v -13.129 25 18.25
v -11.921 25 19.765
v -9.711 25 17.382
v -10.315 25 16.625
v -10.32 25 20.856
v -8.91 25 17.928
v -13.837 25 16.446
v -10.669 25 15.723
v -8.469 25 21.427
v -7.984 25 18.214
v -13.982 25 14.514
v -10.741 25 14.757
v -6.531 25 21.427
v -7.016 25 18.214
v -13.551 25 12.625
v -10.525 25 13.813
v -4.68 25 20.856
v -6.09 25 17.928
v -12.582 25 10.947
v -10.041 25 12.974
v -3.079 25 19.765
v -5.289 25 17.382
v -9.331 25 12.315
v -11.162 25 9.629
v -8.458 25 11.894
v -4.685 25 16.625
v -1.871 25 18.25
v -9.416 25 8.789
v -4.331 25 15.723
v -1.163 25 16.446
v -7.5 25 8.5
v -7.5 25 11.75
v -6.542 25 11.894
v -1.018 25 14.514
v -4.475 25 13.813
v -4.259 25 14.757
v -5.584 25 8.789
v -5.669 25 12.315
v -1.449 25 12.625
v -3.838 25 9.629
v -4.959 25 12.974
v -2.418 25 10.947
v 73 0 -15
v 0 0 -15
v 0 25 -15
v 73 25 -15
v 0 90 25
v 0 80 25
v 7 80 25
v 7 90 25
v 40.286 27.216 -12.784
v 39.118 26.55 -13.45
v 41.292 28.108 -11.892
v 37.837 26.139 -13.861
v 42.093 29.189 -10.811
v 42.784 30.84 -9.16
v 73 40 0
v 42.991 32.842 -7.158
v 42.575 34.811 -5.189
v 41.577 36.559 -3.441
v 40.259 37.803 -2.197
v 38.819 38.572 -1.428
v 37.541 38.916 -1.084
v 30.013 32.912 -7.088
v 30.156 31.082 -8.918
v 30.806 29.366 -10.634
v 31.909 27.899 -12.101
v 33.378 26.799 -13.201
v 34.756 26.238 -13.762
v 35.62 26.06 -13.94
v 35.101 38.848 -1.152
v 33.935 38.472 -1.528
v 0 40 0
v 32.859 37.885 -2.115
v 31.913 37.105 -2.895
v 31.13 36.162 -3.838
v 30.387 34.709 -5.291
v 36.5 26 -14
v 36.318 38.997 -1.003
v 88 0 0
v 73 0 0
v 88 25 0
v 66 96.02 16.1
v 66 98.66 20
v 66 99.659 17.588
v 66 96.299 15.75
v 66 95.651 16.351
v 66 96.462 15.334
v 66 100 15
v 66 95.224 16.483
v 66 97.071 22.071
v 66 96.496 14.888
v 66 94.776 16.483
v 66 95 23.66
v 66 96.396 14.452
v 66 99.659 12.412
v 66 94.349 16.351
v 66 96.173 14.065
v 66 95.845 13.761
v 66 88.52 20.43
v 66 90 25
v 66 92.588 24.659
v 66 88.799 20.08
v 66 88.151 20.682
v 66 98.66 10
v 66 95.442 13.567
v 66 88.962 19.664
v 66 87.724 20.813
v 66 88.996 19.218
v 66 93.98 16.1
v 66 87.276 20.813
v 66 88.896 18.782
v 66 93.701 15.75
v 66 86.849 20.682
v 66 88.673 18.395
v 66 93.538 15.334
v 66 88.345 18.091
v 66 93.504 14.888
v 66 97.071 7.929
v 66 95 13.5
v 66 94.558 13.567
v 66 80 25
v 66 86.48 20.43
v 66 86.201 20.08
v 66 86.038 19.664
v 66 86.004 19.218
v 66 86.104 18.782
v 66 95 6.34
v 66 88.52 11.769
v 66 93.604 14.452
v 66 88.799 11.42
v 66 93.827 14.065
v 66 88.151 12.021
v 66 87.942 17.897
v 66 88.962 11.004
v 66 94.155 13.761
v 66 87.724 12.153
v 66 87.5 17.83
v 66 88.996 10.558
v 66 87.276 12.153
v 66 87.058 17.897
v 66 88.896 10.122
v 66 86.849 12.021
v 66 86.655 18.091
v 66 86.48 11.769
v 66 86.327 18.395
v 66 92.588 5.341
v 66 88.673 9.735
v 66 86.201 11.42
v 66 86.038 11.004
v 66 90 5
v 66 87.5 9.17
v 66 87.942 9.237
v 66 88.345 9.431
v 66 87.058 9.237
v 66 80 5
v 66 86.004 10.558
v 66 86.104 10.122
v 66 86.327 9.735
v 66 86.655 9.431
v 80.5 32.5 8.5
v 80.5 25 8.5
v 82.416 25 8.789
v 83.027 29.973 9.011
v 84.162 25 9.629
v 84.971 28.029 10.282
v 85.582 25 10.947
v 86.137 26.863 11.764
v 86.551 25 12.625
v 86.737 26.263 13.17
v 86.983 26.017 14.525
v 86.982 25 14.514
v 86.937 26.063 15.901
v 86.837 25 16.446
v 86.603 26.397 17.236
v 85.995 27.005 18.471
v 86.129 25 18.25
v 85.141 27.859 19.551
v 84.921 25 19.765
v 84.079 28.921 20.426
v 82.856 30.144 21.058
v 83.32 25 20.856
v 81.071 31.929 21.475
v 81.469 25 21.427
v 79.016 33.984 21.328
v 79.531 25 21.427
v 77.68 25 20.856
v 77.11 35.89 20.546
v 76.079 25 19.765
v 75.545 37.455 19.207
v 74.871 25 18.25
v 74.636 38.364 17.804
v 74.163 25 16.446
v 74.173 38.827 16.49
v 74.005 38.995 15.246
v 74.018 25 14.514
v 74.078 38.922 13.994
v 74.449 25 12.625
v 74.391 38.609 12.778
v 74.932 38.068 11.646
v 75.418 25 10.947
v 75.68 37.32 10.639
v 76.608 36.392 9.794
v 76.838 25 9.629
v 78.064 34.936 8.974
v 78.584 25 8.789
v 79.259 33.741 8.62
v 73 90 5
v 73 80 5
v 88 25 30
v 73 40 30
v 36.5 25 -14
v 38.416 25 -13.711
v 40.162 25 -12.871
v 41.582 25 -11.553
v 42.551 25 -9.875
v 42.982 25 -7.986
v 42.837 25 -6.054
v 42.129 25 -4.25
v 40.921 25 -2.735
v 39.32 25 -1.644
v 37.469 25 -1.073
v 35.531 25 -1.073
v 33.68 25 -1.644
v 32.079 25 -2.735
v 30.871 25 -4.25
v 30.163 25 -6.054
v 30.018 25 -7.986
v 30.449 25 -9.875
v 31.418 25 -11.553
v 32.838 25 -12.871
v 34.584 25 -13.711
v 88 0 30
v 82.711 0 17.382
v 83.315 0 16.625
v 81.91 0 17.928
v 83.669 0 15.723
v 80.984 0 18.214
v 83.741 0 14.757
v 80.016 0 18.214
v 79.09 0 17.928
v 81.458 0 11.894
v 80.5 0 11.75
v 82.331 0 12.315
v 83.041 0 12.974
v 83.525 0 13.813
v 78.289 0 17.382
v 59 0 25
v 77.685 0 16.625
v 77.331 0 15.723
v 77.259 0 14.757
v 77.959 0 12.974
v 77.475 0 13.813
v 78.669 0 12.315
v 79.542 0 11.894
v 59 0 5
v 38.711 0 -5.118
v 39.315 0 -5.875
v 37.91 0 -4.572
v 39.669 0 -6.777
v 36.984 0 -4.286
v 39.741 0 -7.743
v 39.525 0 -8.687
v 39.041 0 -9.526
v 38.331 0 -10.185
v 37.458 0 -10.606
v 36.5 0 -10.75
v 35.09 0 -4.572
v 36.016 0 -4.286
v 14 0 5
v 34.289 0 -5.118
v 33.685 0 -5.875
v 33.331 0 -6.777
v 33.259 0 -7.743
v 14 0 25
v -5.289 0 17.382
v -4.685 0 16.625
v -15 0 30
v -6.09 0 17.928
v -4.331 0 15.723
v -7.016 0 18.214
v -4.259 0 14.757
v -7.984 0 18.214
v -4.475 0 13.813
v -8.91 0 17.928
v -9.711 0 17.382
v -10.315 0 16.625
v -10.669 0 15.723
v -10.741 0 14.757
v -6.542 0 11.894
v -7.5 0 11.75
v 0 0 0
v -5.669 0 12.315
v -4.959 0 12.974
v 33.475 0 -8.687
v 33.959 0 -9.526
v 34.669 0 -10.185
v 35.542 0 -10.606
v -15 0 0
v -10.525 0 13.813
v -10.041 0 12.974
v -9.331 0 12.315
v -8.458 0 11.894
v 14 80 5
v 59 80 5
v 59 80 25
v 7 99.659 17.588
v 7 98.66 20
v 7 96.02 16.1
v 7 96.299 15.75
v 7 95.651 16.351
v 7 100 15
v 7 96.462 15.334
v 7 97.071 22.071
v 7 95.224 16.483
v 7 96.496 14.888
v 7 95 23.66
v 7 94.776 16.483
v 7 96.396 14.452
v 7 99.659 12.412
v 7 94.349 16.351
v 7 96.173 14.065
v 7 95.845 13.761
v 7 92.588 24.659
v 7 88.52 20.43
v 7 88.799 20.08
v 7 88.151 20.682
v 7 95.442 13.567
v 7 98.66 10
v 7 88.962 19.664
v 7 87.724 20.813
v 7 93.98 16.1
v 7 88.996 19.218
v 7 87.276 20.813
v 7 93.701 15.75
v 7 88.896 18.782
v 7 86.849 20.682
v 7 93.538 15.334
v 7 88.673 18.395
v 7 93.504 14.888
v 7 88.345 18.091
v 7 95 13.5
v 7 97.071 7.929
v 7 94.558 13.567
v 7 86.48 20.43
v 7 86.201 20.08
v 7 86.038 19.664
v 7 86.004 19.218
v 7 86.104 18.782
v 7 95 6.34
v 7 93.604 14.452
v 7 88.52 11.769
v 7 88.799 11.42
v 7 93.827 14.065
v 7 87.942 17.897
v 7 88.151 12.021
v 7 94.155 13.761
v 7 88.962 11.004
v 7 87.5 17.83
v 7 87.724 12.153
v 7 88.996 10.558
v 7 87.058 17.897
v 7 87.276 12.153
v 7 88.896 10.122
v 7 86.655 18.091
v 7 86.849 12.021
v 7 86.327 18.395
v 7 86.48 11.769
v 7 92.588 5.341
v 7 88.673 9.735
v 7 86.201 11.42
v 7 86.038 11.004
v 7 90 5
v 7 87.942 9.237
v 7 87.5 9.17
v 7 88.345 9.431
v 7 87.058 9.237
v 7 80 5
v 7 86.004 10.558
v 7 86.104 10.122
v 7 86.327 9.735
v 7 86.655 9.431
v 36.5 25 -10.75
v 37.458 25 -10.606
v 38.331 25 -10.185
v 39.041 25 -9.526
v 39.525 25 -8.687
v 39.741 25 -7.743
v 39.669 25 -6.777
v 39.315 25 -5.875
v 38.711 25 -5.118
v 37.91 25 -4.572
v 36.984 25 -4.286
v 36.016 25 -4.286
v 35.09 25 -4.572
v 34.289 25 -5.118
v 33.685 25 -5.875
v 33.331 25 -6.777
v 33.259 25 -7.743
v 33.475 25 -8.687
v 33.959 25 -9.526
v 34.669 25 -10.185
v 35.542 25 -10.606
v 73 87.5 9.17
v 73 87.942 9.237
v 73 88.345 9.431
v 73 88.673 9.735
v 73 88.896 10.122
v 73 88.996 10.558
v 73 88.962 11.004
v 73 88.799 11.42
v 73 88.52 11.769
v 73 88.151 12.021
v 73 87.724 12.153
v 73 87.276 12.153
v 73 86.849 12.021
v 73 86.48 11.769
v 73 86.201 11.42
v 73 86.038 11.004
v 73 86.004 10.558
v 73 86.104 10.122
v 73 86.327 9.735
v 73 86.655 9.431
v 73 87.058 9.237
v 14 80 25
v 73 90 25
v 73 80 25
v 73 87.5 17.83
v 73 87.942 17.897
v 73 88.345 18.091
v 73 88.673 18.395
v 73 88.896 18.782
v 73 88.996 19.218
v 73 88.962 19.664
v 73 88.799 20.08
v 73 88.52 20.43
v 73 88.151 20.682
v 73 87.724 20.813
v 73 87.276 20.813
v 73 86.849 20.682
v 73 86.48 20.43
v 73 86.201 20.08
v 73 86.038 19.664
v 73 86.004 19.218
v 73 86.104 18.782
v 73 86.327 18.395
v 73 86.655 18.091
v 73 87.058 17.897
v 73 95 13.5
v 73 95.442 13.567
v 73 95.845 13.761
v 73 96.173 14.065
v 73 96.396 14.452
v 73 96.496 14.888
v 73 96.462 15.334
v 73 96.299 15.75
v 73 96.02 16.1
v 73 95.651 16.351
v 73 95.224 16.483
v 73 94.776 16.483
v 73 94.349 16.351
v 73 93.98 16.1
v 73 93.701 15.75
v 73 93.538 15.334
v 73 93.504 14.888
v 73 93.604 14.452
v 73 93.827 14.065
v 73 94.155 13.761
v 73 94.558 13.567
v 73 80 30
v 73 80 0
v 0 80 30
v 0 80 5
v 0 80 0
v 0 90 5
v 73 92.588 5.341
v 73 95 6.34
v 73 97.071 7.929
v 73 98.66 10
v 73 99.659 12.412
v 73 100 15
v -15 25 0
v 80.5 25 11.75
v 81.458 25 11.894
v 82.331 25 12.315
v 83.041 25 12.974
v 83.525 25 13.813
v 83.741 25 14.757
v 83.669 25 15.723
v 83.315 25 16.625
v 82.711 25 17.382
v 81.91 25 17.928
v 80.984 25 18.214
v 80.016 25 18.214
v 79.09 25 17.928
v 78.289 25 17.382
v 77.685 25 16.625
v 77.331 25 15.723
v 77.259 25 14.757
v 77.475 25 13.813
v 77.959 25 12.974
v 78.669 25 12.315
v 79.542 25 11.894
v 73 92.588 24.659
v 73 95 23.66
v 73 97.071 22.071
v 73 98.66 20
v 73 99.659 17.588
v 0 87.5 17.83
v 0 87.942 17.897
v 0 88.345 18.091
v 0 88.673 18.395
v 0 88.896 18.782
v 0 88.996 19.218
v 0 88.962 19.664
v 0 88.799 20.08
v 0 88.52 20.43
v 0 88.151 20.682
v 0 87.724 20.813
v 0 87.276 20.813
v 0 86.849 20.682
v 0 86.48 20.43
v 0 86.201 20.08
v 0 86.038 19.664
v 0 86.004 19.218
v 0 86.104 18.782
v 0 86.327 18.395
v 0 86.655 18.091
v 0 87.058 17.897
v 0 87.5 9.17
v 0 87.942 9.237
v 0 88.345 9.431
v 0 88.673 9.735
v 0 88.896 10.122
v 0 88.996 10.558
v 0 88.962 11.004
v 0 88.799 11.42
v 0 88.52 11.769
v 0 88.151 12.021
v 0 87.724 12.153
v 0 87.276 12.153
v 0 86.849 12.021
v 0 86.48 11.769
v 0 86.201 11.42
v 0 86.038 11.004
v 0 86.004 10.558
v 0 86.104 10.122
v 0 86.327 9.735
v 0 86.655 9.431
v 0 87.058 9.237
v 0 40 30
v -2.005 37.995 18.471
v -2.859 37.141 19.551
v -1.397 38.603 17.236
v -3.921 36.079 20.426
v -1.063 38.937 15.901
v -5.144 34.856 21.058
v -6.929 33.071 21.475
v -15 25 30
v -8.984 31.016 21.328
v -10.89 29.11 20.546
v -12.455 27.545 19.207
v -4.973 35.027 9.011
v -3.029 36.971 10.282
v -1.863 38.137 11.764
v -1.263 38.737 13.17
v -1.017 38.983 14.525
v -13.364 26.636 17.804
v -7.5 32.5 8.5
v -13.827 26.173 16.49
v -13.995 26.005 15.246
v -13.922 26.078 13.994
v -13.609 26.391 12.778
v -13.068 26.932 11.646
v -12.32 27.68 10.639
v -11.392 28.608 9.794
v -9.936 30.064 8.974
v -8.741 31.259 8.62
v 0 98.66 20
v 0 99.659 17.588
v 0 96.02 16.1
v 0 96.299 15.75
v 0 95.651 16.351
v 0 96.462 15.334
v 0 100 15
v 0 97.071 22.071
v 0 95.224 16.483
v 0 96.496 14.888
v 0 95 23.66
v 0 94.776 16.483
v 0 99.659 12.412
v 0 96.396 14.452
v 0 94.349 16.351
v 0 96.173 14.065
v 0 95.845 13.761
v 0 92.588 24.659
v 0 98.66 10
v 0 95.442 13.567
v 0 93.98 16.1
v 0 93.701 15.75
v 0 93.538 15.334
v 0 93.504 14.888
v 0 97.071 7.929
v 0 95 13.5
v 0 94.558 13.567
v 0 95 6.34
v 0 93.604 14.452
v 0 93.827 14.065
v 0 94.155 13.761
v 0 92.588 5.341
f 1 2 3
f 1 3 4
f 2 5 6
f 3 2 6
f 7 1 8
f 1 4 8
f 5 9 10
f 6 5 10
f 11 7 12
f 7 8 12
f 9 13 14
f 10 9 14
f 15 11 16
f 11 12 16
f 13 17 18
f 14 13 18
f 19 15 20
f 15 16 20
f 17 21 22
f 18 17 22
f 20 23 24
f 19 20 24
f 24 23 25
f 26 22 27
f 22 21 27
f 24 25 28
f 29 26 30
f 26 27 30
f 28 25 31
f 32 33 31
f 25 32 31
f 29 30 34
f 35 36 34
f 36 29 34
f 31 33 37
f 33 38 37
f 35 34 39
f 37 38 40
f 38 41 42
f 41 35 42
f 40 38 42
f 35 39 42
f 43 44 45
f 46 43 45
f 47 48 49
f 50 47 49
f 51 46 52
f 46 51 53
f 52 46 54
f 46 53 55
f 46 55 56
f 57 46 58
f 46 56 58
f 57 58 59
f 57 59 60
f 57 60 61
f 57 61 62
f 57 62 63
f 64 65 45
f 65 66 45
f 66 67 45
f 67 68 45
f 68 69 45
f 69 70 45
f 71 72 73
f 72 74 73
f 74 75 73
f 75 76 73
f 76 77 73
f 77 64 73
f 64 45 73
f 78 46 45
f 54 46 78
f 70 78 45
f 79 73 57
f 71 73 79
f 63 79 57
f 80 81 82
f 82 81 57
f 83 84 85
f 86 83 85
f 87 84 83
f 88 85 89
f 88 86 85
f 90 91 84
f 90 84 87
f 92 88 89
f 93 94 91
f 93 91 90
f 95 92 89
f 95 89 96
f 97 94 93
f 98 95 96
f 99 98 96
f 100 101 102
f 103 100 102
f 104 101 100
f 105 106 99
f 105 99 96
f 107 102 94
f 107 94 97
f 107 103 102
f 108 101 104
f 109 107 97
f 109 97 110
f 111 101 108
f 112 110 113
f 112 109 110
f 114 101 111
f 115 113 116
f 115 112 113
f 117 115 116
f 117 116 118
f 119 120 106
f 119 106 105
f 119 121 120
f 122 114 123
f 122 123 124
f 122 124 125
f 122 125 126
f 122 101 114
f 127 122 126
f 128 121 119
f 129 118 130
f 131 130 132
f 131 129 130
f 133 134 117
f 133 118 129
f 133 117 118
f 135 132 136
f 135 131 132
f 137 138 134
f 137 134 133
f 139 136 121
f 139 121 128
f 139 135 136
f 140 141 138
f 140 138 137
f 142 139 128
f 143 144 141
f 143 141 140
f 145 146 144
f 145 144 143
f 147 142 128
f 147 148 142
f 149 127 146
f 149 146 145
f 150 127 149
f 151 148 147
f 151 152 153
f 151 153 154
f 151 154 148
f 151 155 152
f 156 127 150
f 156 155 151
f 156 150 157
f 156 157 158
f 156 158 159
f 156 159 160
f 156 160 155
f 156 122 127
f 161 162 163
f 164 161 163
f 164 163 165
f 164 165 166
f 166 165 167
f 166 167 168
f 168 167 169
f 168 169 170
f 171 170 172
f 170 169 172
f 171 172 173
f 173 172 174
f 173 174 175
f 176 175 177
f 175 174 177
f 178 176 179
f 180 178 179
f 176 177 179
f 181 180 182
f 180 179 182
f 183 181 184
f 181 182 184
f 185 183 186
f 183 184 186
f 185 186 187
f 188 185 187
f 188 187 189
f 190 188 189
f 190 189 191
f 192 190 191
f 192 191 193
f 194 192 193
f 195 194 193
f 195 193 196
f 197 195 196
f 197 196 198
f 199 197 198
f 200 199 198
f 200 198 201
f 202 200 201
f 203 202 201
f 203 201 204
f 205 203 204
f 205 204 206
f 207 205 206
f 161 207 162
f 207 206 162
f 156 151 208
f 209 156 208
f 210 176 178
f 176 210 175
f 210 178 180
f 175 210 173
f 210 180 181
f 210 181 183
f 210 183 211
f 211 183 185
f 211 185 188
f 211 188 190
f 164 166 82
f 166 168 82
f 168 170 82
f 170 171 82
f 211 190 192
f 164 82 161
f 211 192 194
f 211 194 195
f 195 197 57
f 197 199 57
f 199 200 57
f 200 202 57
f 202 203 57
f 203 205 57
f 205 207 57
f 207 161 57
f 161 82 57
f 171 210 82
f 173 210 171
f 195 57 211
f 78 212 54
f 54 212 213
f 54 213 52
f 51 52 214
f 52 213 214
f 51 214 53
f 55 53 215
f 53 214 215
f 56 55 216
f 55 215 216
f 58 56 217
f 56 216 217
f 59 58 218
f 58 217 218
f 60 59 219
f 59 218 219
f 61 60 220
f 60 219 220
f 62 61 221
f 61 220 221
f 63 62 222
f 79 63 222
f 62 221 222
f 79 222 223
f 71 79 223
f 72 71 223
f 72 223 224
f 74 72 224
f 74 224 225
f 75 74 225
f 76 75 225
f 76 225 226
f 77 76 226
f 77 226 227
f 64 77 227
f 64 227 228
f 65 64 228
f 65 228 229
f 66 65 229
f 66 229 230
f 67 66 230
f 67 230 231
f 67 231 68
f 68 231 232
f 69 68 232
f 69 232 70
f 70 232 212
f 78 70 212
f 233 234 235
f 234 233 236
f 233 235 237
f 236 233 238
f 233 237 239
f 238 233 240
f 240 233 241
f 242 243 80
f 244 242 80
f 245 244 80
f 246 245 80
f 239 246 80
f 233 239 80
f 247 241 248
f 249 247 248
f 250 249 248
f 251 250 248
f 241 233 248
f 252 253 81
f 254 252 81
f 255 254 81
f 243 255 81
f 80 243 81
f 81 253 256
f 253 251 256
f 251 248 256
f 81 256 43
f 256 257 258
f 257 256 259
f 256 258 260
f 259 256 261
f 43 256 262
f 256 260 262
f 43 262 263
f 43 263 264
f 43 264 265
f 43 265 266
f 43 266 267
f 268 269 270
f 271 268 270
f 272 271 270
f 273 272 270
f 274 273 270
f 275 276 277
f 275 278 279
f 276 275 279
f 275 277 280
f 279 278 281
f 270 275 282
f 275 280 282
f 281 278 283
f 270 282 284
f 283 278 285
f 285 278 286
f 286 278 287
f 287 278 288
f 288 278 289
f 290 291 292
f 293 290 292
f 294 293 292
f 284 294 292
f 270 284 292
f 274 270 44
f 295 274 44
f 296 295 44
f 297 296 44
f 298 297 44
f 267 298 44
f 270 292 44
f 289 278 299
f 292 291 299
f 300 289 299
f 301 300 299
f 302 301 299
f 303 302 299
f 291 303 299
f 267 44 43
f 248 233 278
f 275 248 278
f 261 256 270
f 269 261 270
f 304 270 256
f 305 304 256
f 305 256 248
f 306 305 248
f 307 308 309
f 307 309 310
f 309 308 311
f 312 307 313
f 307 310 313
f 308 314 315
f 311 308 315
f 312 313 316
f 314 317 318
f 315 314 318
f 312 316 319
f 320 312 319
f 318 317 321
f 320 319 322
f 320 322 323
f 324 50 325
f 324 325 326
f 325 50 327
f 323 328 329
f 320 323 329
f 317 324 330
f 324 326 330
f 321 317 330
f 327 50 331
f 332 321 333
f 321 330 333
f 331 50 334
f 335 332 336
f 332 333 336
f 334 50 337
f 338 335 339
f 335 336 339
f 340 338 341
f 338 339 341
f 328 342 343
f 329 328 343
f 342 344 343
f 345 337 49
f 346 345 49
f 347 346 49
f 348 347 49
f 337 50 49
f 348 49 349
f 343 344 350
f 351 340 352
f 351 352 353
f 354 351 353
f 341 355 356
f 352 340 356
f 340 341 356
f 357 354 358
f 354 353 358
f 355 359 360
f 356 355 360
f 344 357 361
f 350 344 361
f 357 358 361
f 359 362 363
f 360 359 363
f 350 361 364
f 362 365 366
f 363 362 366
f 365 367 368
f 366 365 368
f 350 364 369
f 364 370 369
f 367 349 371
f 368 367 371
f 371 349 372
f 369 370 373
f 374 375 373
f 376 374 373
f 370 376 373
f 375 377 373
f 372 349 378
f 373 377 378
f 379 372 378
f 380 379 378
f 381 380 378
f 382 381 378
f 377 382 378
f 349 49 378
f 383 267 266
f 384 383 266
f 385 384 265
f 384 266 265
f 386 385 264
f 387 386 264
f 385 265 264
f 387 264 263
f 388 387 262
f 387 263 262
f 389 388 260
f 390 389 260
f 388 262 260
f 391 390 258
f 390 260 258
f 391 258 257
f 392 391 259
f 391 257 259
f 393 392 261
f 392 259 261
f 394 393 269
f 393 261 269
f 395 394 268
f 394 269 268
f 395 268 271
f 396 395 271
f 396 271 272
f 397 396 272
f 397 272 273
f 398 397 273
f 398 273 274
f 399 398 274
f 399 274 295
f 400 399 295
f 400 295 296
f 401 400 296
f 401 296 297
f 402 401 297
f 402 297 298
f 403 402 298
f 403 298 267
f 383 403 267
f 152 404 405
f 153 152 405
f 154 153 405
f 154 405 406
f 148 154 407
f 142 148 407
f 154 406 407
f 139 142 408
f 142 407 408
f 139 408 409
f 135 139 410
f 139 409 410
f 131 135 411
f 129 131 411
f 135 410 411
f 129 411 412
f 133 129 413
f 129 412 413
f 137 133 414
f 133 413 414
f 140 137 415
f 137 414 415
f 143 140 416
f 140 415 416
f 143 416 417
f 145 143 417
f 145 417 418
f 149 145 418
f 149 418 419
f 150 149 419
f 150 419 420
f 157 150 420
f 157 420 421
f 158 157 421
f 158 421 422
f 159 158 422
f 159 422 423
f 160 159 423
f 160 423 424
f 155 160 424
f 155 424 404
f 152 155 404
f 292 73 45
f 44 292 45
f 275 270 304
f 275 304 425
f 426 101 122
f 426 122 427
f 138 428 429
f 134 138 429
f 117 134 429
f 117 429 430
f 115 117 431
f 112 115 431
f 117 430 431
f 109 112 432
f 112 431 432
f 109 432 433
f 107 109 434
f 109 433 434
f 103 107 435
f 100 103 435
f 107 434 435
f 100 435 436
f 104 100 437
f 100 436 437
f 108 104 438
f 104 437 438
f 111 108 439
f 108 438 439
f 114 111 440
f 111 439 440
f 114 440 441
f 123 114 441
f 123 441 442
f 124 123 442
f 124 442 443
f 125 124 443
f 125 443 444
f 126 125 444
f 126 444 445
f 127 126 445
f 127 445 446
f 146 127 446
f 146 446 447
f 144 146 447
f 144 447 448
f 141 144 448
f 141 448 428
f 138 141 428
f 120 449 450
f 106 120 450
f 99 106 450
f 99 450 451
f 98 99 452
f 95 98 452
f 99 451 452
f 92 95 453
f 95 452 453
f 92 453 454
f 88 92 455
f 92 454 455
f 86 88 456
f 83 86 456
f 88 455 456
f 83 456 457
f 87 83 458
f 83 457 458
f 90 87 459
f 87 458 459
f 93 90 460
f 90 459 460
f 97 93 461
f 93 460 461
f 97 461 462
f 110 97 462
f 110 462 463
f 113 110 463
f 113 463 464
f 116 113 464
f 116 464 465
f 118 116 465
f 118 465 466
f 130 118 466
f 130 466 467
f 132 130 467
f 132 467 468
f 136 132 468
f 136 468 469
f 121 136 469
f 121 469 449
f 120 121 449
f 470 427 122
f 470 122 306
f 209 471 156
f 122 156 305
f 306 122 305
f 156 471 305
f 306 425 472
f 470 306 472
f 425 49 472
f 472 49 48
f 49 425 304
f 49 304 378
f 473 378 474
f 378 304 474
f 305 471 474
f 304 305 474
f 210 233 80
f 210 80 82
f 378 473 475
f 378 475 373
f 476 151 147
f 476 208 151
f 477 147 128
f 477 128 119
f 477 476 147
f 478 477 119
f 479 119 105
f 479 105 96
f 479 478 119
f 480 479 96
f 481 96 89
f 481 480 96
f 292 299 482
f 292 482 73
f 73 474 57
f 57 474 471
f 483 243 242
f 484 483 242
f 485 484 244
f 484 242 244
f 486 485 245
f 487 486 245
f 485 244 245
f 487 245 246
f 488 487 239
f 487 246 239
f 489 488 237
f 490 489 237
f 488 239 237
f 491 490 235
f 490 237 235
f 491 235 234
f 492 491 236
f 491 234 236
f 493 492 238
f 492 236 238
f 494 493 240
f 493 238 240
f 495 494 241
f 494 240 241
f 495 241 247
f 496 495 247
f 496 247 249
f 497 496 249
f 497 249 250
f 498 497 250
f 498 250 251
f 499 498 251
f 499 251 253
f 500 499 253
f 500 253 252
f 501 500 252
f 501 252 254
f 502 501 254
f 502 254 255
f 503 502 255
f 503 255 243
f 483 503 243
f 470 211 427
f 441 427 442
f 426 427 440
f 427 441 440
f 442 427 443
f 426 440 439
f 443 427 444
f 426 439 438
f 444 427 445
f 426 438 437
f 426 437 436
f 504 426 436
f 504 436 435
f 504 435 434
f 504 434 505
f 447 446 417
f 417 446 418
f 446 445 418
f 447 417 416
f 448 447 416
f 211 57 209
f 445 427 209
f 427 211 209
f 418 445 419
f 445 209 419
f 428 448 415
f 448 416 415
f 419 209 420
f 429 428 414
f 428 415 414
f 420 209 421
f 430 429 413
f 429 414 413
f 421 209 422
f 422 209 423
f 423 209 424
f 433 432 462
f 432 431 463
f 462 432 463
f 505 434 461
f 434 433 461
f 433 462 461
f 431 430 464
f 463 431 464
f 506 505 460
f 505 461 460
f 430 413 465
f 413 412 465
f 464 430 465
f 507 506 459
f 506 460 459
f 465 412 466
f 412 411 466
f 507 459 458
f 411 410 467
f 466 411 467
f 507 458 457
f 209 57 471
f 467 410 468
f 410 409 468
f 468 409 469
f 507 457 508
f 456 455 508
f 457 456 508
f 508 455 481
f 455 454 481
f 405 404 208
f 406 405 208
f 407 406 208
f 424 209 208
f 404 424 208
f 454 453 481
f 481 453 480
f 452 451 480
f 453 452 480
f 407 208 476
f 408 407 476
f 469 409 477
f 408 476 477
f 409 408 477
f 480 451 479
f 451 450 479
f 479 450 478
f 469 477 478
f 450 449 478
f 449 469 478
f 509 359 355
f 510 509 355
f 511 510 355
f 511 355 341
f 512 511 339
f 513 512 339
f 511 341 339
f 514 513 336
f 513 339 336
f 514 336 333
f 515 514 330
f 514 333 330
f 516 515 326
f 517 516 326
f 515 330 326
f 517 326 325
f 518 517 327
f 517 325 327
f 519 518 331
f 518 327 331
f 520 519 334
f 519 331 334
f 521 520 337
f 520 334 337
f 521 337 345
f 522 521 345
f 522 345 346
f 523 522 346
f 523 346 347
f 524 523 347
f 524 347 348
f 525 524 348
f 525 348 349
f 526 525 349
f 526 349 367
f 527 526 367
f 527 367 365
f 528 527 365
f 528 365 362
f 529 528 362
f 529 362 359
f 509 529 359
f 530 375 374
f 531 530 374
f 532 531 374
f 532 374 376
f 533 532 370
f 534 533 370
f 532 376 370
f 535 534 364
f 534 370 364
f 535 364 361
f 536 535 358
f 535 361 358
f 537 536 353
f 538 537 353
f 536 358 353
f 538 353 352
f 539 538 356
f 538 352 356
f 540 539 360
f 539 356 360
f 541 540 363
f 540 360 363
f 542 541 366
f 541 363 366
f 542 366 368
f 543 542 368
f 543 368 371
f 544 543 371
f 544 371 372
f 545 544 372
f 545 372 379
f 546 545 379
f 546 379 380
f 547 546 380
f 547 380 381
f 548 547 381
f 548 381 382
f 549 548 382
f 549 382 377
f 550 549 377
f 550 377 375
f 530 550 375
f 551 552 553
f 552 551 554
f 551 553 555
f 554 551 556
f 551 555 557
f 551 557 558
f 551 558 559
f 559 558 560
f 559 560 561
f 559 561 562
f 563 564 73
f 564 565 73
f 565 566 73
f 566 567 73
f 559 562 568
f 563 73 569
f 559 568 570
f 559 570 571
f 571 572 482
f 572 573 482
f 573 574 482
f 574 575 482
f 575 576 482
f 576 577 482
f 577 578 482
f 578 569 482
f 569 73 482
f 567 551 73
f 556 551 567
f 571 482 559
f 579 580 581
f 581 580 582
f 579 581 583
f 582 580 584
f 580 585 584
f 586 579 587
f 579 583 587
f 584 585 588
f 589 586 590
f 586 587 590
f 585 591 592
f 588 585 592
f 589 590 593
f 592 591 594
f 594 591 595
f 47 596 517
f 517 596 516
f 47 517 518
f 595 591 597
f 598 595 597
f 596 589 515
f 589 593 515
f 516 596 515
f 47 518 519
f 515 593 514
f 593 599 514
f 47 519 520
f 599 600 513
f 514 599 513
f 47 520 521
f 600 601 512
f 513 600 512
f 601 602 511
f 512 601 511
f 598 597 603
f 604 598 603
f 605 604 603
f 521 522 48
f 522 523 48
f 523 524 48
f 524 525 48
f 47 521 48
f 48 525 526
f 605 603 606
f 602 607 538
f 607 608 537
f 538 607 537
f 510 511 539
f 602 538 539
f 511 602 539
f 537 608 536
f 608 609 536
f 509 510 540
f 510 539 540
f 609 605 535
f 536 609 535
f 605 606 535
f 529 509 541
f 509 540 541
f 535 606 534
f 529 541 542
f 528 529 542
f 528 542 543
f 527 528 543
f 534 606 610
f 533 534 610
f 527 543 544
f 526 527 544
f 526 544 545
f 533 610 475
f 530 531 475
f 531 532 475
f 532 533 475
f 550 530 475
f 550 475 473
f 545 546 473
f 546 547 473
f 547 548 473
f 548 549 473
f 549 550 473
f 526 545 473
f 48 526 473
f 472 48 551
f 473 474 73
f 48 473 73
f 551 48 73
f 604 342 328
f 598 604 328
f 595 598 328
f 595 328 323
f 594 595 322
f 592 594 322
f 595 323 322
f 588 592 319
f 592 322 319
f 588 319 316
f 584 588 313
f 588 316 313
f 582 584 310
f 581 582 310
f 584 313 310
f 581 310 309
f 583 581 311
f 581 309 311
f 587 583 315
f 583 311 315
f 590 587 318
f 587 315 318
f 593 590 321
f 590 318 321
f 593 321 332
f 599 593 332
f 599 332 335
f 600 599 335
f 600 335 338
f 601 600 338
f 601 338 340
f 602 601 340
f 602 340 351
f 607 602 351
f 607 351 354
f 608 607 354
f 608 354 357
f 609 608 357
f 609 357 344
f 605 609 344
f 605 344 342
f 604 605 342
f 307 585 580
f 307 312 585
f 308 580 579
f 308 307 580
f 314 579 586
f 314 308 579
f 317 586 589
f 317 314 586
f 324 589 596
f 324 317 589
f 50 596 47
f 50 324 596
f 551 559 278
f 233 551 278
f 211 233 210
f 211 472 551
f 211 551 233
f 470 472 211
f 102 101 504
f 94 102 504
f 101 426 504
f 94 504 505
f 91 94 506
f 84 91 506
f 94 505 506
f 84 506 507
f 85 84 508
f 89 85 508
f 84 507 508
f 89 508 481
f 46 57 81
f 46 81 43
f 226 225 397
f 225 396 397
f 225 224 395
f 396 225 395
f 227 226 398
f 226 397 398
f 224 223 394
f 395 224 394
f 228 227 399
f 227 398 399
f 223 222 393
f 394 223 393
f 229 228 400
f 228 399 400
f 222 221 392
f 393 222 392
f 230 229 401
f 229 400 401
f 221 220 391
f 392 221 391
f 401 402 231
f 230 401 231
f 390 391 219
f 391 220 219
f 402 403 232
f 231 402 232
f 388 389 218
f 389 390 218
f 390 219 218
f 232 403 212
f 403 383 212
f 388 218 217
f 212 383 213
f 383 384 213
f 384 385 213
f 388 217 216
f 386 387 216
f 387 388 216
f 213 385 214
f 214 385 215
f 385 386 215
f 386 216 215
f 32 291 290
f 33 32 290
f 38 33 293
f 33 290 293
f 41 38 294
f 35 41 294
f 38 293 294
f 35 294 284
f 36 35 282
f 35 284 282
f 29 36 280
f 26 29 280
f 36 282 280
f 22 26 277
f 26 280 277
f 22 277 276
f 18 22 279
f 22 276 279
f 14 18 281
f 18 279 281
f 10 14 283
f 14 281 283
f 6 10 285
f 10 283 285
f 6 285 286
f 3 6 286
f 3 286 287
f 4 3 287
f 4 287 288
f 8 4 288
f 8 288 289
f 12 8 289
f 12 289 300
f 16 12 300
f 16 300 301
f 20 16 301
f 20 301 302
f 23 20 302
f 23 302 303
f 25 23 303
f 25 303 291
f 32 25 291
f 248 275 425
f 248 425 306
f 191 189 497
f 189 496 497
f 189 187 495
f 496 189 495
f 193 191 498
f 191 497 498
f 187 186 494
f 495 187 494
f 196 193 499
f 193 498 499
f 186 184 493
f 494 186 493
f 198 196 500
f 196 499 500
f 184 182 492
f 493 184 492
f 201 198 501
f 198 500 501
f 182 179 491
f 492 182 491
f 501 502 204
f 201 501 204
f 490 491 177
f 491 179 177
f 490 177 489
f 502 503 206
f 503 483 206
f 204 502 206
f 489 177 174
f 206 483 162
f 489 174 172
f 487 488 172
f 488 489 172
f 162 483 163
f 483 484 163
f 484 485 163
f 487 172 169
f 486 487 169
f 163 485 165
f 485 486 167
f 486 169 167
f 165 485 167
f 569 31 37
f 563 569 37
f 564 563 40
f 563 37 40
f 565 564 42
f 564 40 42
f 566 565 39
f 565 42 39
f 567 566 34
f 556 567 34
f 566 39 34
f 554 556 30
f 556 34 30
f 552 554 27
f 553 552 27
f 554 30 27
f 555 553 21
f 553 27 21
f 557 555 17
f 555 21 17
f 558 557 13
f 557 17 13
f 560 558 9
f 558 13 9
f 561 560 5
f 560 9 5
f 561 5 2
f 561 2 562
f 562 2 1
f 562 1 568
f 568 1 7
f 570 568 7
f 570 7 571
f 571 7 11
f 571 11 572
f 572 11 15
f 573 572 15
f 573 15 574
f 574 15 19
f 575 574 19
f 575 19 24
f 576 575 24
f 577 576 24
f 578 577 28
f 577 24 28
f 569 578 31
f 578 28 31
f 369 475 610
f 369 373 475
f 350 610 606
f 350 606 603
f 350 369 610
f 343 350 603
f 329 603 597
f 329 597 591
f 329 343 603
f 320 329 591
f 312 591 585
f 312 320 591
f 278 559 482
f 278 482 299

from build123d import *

# Parameters (mm, degrees)
BOSS_EXTRUDE1_DEPTH = 30
SKETCH2_R           = 3.25
SKETCH2_W           = 45
SKETCH2_H           = 20
CUT_EXTRUDE1_DEPTH  = 90
SKETCH3_W           = 7
SKETCH3_H           = 20
BOSS_EXTRUDE2_DEPTH = 20
SKETCH4_R           = 1.5
CUT_EXTRUDE2_DEPTH  = 80
FILLET1_R           = 10
CUT_EXTRUDE3_START  = -25
SKETCH5_R           = 6.5
CUT_EXTRUDE3_DEPTH  = 17
BOSS_EXTRUDE3_DEPTH = 73
SKETCH7_R           = 3.25
CUT_EXTRUDE4_DEPTH  = 40
CUT_EXTRUDE5_START  = -25
SKETCH8_R           = 6.5
CUT_EXTRUDE5_DEPTH  = 17


with BuildPart() as part:
    # Sketch1 → Boss-Extrude1 (new body)
    with BuildSketch(Plane.XY):
        Polygon((0, 40), (-15, 25), (-15, 0), (0, 0), (73, 0), (88, 0), (88, 25), (73, 40), (73, 80), (0, 80), align=None)
    extrude(amount=BOSS_EXTRUDE1_DEPTH)

    # Sketch2 → Cut-Extrude1 (cut)
    with BuildSketch(Plane.XZ):
        with Locations(Location((-7.5, 15, 0), (0, 0, 270))):
            Circle(SKETCH2_R)
        with Locations(Location((80.5, 15, 0), (0, 0, 270))):
            Circle(SKETCH2_R)
        with Locations((36.5, 15)):
            Rectangle(SKETCH2_W, SKETCH2_H)
    extrude(amount=-CUT_EXTRUDE1_DEPTH, mode=Mode.SUBTRACT)

    # Sketch3 → Boss-Extrude2 (add)
    with BuildSketch(Plane(origin=(0, 80, 0), x_dir=(1, 0, 0), z_dir=(0, 1, 0))):
        with Locations((3.5, -15)):
            Rectangle(SKETCH3_W, SKETCH3_H)
        with Locations((69.5, -15)):
            Rectangle(SKETCH3_W, SKETCH3_H)
    extrude(amount=BOSS_EXTRUDE2_DEPTH)

    # Sketch4 → Cut-Extrude2 (cut)
    with BuildSketch(Plane(origin=(73, 0, 0), x_dir=(0, 0, -1), z_dir=(1, 0, 0))):
        with Locations((-15, 95)):
            Circle(SKETCH4_R)
        with Locations((-10.669872981, 87.5)):
            Circle(SKETCH4_R)
        with Locations((-19.330127019, 87.5)):
            Circle(SKETCH4_R)
    extrude(amount=-CUT_EXTRUDE2_DEPTH, mode=Mode.SUBTRACT)

    # Fillet1
    fillet1_edges = [part.edges().sort_by_distance(p)[0] for p in [
        (3.5, 100, 25),
        (69.5, 100, 25),
        (3.5, 100, 5),
        (69.5, 100, 5),
    ]]
    fillet(fillet1_edges, radius=FILLET1_R - 0.0001)  # a hair under: the kernel refuses the full size

    # Sketch5 → Cut-Extrude3 (cut)
    with BuildSketch(Plane.XZ.offset(CUT_EXTRUDE3_START)):
        with Locations(Location((-7.5, 15, 0), (0, 0, 270))):
            Circle(SKETCH5_R)
        with Locations(Location((80.5, 15, 0), (0, 0, 270))):
            Circle(SKETCH5_R)
    extrude(amount=-CUT_EXTRUDE3_DEPTH, mode=Mode.SUBTRACT)

    # Sketch6 → Boss-Extrude3 (add)
    with BuildSketch(Plane(origin=(0, 0, 0), x_dir=(0, 0, -1), z_dir=(1, 0, 0))):
        Polygon((0, 40), (0, 0), (15, 0), (15, 25), align=None)
    extrude(amount=BOSS_EXTRUDE3_DEPTH)

    # Sketch7 → Cut-Extrude4 (cut)
    with BuildSketch(Plane.XZ):
        with Locations(Location((36.5, -7.5, 0), (0, 0, 270))):
            Circle(SKETCH7_R)
    extrude(amount=-CUT_EXTRUDE4_DEPTH, mode=Mode.SUBTRACT)

    # Sketch8 → Cut-Extrude5 (cut)
    with BuildSketch(Plane.XZ.offset(CUT_EXTRUDE5_START)):
        with Locations(Location((36.5, -7.5, 0), (0, 0, 270))):
            Circle(SKETCH8_R)
    extrude(amount=-CUT_EXTRUDE5_DEPTH, mode=Mode.SUBTRACT)


solid = part.part
